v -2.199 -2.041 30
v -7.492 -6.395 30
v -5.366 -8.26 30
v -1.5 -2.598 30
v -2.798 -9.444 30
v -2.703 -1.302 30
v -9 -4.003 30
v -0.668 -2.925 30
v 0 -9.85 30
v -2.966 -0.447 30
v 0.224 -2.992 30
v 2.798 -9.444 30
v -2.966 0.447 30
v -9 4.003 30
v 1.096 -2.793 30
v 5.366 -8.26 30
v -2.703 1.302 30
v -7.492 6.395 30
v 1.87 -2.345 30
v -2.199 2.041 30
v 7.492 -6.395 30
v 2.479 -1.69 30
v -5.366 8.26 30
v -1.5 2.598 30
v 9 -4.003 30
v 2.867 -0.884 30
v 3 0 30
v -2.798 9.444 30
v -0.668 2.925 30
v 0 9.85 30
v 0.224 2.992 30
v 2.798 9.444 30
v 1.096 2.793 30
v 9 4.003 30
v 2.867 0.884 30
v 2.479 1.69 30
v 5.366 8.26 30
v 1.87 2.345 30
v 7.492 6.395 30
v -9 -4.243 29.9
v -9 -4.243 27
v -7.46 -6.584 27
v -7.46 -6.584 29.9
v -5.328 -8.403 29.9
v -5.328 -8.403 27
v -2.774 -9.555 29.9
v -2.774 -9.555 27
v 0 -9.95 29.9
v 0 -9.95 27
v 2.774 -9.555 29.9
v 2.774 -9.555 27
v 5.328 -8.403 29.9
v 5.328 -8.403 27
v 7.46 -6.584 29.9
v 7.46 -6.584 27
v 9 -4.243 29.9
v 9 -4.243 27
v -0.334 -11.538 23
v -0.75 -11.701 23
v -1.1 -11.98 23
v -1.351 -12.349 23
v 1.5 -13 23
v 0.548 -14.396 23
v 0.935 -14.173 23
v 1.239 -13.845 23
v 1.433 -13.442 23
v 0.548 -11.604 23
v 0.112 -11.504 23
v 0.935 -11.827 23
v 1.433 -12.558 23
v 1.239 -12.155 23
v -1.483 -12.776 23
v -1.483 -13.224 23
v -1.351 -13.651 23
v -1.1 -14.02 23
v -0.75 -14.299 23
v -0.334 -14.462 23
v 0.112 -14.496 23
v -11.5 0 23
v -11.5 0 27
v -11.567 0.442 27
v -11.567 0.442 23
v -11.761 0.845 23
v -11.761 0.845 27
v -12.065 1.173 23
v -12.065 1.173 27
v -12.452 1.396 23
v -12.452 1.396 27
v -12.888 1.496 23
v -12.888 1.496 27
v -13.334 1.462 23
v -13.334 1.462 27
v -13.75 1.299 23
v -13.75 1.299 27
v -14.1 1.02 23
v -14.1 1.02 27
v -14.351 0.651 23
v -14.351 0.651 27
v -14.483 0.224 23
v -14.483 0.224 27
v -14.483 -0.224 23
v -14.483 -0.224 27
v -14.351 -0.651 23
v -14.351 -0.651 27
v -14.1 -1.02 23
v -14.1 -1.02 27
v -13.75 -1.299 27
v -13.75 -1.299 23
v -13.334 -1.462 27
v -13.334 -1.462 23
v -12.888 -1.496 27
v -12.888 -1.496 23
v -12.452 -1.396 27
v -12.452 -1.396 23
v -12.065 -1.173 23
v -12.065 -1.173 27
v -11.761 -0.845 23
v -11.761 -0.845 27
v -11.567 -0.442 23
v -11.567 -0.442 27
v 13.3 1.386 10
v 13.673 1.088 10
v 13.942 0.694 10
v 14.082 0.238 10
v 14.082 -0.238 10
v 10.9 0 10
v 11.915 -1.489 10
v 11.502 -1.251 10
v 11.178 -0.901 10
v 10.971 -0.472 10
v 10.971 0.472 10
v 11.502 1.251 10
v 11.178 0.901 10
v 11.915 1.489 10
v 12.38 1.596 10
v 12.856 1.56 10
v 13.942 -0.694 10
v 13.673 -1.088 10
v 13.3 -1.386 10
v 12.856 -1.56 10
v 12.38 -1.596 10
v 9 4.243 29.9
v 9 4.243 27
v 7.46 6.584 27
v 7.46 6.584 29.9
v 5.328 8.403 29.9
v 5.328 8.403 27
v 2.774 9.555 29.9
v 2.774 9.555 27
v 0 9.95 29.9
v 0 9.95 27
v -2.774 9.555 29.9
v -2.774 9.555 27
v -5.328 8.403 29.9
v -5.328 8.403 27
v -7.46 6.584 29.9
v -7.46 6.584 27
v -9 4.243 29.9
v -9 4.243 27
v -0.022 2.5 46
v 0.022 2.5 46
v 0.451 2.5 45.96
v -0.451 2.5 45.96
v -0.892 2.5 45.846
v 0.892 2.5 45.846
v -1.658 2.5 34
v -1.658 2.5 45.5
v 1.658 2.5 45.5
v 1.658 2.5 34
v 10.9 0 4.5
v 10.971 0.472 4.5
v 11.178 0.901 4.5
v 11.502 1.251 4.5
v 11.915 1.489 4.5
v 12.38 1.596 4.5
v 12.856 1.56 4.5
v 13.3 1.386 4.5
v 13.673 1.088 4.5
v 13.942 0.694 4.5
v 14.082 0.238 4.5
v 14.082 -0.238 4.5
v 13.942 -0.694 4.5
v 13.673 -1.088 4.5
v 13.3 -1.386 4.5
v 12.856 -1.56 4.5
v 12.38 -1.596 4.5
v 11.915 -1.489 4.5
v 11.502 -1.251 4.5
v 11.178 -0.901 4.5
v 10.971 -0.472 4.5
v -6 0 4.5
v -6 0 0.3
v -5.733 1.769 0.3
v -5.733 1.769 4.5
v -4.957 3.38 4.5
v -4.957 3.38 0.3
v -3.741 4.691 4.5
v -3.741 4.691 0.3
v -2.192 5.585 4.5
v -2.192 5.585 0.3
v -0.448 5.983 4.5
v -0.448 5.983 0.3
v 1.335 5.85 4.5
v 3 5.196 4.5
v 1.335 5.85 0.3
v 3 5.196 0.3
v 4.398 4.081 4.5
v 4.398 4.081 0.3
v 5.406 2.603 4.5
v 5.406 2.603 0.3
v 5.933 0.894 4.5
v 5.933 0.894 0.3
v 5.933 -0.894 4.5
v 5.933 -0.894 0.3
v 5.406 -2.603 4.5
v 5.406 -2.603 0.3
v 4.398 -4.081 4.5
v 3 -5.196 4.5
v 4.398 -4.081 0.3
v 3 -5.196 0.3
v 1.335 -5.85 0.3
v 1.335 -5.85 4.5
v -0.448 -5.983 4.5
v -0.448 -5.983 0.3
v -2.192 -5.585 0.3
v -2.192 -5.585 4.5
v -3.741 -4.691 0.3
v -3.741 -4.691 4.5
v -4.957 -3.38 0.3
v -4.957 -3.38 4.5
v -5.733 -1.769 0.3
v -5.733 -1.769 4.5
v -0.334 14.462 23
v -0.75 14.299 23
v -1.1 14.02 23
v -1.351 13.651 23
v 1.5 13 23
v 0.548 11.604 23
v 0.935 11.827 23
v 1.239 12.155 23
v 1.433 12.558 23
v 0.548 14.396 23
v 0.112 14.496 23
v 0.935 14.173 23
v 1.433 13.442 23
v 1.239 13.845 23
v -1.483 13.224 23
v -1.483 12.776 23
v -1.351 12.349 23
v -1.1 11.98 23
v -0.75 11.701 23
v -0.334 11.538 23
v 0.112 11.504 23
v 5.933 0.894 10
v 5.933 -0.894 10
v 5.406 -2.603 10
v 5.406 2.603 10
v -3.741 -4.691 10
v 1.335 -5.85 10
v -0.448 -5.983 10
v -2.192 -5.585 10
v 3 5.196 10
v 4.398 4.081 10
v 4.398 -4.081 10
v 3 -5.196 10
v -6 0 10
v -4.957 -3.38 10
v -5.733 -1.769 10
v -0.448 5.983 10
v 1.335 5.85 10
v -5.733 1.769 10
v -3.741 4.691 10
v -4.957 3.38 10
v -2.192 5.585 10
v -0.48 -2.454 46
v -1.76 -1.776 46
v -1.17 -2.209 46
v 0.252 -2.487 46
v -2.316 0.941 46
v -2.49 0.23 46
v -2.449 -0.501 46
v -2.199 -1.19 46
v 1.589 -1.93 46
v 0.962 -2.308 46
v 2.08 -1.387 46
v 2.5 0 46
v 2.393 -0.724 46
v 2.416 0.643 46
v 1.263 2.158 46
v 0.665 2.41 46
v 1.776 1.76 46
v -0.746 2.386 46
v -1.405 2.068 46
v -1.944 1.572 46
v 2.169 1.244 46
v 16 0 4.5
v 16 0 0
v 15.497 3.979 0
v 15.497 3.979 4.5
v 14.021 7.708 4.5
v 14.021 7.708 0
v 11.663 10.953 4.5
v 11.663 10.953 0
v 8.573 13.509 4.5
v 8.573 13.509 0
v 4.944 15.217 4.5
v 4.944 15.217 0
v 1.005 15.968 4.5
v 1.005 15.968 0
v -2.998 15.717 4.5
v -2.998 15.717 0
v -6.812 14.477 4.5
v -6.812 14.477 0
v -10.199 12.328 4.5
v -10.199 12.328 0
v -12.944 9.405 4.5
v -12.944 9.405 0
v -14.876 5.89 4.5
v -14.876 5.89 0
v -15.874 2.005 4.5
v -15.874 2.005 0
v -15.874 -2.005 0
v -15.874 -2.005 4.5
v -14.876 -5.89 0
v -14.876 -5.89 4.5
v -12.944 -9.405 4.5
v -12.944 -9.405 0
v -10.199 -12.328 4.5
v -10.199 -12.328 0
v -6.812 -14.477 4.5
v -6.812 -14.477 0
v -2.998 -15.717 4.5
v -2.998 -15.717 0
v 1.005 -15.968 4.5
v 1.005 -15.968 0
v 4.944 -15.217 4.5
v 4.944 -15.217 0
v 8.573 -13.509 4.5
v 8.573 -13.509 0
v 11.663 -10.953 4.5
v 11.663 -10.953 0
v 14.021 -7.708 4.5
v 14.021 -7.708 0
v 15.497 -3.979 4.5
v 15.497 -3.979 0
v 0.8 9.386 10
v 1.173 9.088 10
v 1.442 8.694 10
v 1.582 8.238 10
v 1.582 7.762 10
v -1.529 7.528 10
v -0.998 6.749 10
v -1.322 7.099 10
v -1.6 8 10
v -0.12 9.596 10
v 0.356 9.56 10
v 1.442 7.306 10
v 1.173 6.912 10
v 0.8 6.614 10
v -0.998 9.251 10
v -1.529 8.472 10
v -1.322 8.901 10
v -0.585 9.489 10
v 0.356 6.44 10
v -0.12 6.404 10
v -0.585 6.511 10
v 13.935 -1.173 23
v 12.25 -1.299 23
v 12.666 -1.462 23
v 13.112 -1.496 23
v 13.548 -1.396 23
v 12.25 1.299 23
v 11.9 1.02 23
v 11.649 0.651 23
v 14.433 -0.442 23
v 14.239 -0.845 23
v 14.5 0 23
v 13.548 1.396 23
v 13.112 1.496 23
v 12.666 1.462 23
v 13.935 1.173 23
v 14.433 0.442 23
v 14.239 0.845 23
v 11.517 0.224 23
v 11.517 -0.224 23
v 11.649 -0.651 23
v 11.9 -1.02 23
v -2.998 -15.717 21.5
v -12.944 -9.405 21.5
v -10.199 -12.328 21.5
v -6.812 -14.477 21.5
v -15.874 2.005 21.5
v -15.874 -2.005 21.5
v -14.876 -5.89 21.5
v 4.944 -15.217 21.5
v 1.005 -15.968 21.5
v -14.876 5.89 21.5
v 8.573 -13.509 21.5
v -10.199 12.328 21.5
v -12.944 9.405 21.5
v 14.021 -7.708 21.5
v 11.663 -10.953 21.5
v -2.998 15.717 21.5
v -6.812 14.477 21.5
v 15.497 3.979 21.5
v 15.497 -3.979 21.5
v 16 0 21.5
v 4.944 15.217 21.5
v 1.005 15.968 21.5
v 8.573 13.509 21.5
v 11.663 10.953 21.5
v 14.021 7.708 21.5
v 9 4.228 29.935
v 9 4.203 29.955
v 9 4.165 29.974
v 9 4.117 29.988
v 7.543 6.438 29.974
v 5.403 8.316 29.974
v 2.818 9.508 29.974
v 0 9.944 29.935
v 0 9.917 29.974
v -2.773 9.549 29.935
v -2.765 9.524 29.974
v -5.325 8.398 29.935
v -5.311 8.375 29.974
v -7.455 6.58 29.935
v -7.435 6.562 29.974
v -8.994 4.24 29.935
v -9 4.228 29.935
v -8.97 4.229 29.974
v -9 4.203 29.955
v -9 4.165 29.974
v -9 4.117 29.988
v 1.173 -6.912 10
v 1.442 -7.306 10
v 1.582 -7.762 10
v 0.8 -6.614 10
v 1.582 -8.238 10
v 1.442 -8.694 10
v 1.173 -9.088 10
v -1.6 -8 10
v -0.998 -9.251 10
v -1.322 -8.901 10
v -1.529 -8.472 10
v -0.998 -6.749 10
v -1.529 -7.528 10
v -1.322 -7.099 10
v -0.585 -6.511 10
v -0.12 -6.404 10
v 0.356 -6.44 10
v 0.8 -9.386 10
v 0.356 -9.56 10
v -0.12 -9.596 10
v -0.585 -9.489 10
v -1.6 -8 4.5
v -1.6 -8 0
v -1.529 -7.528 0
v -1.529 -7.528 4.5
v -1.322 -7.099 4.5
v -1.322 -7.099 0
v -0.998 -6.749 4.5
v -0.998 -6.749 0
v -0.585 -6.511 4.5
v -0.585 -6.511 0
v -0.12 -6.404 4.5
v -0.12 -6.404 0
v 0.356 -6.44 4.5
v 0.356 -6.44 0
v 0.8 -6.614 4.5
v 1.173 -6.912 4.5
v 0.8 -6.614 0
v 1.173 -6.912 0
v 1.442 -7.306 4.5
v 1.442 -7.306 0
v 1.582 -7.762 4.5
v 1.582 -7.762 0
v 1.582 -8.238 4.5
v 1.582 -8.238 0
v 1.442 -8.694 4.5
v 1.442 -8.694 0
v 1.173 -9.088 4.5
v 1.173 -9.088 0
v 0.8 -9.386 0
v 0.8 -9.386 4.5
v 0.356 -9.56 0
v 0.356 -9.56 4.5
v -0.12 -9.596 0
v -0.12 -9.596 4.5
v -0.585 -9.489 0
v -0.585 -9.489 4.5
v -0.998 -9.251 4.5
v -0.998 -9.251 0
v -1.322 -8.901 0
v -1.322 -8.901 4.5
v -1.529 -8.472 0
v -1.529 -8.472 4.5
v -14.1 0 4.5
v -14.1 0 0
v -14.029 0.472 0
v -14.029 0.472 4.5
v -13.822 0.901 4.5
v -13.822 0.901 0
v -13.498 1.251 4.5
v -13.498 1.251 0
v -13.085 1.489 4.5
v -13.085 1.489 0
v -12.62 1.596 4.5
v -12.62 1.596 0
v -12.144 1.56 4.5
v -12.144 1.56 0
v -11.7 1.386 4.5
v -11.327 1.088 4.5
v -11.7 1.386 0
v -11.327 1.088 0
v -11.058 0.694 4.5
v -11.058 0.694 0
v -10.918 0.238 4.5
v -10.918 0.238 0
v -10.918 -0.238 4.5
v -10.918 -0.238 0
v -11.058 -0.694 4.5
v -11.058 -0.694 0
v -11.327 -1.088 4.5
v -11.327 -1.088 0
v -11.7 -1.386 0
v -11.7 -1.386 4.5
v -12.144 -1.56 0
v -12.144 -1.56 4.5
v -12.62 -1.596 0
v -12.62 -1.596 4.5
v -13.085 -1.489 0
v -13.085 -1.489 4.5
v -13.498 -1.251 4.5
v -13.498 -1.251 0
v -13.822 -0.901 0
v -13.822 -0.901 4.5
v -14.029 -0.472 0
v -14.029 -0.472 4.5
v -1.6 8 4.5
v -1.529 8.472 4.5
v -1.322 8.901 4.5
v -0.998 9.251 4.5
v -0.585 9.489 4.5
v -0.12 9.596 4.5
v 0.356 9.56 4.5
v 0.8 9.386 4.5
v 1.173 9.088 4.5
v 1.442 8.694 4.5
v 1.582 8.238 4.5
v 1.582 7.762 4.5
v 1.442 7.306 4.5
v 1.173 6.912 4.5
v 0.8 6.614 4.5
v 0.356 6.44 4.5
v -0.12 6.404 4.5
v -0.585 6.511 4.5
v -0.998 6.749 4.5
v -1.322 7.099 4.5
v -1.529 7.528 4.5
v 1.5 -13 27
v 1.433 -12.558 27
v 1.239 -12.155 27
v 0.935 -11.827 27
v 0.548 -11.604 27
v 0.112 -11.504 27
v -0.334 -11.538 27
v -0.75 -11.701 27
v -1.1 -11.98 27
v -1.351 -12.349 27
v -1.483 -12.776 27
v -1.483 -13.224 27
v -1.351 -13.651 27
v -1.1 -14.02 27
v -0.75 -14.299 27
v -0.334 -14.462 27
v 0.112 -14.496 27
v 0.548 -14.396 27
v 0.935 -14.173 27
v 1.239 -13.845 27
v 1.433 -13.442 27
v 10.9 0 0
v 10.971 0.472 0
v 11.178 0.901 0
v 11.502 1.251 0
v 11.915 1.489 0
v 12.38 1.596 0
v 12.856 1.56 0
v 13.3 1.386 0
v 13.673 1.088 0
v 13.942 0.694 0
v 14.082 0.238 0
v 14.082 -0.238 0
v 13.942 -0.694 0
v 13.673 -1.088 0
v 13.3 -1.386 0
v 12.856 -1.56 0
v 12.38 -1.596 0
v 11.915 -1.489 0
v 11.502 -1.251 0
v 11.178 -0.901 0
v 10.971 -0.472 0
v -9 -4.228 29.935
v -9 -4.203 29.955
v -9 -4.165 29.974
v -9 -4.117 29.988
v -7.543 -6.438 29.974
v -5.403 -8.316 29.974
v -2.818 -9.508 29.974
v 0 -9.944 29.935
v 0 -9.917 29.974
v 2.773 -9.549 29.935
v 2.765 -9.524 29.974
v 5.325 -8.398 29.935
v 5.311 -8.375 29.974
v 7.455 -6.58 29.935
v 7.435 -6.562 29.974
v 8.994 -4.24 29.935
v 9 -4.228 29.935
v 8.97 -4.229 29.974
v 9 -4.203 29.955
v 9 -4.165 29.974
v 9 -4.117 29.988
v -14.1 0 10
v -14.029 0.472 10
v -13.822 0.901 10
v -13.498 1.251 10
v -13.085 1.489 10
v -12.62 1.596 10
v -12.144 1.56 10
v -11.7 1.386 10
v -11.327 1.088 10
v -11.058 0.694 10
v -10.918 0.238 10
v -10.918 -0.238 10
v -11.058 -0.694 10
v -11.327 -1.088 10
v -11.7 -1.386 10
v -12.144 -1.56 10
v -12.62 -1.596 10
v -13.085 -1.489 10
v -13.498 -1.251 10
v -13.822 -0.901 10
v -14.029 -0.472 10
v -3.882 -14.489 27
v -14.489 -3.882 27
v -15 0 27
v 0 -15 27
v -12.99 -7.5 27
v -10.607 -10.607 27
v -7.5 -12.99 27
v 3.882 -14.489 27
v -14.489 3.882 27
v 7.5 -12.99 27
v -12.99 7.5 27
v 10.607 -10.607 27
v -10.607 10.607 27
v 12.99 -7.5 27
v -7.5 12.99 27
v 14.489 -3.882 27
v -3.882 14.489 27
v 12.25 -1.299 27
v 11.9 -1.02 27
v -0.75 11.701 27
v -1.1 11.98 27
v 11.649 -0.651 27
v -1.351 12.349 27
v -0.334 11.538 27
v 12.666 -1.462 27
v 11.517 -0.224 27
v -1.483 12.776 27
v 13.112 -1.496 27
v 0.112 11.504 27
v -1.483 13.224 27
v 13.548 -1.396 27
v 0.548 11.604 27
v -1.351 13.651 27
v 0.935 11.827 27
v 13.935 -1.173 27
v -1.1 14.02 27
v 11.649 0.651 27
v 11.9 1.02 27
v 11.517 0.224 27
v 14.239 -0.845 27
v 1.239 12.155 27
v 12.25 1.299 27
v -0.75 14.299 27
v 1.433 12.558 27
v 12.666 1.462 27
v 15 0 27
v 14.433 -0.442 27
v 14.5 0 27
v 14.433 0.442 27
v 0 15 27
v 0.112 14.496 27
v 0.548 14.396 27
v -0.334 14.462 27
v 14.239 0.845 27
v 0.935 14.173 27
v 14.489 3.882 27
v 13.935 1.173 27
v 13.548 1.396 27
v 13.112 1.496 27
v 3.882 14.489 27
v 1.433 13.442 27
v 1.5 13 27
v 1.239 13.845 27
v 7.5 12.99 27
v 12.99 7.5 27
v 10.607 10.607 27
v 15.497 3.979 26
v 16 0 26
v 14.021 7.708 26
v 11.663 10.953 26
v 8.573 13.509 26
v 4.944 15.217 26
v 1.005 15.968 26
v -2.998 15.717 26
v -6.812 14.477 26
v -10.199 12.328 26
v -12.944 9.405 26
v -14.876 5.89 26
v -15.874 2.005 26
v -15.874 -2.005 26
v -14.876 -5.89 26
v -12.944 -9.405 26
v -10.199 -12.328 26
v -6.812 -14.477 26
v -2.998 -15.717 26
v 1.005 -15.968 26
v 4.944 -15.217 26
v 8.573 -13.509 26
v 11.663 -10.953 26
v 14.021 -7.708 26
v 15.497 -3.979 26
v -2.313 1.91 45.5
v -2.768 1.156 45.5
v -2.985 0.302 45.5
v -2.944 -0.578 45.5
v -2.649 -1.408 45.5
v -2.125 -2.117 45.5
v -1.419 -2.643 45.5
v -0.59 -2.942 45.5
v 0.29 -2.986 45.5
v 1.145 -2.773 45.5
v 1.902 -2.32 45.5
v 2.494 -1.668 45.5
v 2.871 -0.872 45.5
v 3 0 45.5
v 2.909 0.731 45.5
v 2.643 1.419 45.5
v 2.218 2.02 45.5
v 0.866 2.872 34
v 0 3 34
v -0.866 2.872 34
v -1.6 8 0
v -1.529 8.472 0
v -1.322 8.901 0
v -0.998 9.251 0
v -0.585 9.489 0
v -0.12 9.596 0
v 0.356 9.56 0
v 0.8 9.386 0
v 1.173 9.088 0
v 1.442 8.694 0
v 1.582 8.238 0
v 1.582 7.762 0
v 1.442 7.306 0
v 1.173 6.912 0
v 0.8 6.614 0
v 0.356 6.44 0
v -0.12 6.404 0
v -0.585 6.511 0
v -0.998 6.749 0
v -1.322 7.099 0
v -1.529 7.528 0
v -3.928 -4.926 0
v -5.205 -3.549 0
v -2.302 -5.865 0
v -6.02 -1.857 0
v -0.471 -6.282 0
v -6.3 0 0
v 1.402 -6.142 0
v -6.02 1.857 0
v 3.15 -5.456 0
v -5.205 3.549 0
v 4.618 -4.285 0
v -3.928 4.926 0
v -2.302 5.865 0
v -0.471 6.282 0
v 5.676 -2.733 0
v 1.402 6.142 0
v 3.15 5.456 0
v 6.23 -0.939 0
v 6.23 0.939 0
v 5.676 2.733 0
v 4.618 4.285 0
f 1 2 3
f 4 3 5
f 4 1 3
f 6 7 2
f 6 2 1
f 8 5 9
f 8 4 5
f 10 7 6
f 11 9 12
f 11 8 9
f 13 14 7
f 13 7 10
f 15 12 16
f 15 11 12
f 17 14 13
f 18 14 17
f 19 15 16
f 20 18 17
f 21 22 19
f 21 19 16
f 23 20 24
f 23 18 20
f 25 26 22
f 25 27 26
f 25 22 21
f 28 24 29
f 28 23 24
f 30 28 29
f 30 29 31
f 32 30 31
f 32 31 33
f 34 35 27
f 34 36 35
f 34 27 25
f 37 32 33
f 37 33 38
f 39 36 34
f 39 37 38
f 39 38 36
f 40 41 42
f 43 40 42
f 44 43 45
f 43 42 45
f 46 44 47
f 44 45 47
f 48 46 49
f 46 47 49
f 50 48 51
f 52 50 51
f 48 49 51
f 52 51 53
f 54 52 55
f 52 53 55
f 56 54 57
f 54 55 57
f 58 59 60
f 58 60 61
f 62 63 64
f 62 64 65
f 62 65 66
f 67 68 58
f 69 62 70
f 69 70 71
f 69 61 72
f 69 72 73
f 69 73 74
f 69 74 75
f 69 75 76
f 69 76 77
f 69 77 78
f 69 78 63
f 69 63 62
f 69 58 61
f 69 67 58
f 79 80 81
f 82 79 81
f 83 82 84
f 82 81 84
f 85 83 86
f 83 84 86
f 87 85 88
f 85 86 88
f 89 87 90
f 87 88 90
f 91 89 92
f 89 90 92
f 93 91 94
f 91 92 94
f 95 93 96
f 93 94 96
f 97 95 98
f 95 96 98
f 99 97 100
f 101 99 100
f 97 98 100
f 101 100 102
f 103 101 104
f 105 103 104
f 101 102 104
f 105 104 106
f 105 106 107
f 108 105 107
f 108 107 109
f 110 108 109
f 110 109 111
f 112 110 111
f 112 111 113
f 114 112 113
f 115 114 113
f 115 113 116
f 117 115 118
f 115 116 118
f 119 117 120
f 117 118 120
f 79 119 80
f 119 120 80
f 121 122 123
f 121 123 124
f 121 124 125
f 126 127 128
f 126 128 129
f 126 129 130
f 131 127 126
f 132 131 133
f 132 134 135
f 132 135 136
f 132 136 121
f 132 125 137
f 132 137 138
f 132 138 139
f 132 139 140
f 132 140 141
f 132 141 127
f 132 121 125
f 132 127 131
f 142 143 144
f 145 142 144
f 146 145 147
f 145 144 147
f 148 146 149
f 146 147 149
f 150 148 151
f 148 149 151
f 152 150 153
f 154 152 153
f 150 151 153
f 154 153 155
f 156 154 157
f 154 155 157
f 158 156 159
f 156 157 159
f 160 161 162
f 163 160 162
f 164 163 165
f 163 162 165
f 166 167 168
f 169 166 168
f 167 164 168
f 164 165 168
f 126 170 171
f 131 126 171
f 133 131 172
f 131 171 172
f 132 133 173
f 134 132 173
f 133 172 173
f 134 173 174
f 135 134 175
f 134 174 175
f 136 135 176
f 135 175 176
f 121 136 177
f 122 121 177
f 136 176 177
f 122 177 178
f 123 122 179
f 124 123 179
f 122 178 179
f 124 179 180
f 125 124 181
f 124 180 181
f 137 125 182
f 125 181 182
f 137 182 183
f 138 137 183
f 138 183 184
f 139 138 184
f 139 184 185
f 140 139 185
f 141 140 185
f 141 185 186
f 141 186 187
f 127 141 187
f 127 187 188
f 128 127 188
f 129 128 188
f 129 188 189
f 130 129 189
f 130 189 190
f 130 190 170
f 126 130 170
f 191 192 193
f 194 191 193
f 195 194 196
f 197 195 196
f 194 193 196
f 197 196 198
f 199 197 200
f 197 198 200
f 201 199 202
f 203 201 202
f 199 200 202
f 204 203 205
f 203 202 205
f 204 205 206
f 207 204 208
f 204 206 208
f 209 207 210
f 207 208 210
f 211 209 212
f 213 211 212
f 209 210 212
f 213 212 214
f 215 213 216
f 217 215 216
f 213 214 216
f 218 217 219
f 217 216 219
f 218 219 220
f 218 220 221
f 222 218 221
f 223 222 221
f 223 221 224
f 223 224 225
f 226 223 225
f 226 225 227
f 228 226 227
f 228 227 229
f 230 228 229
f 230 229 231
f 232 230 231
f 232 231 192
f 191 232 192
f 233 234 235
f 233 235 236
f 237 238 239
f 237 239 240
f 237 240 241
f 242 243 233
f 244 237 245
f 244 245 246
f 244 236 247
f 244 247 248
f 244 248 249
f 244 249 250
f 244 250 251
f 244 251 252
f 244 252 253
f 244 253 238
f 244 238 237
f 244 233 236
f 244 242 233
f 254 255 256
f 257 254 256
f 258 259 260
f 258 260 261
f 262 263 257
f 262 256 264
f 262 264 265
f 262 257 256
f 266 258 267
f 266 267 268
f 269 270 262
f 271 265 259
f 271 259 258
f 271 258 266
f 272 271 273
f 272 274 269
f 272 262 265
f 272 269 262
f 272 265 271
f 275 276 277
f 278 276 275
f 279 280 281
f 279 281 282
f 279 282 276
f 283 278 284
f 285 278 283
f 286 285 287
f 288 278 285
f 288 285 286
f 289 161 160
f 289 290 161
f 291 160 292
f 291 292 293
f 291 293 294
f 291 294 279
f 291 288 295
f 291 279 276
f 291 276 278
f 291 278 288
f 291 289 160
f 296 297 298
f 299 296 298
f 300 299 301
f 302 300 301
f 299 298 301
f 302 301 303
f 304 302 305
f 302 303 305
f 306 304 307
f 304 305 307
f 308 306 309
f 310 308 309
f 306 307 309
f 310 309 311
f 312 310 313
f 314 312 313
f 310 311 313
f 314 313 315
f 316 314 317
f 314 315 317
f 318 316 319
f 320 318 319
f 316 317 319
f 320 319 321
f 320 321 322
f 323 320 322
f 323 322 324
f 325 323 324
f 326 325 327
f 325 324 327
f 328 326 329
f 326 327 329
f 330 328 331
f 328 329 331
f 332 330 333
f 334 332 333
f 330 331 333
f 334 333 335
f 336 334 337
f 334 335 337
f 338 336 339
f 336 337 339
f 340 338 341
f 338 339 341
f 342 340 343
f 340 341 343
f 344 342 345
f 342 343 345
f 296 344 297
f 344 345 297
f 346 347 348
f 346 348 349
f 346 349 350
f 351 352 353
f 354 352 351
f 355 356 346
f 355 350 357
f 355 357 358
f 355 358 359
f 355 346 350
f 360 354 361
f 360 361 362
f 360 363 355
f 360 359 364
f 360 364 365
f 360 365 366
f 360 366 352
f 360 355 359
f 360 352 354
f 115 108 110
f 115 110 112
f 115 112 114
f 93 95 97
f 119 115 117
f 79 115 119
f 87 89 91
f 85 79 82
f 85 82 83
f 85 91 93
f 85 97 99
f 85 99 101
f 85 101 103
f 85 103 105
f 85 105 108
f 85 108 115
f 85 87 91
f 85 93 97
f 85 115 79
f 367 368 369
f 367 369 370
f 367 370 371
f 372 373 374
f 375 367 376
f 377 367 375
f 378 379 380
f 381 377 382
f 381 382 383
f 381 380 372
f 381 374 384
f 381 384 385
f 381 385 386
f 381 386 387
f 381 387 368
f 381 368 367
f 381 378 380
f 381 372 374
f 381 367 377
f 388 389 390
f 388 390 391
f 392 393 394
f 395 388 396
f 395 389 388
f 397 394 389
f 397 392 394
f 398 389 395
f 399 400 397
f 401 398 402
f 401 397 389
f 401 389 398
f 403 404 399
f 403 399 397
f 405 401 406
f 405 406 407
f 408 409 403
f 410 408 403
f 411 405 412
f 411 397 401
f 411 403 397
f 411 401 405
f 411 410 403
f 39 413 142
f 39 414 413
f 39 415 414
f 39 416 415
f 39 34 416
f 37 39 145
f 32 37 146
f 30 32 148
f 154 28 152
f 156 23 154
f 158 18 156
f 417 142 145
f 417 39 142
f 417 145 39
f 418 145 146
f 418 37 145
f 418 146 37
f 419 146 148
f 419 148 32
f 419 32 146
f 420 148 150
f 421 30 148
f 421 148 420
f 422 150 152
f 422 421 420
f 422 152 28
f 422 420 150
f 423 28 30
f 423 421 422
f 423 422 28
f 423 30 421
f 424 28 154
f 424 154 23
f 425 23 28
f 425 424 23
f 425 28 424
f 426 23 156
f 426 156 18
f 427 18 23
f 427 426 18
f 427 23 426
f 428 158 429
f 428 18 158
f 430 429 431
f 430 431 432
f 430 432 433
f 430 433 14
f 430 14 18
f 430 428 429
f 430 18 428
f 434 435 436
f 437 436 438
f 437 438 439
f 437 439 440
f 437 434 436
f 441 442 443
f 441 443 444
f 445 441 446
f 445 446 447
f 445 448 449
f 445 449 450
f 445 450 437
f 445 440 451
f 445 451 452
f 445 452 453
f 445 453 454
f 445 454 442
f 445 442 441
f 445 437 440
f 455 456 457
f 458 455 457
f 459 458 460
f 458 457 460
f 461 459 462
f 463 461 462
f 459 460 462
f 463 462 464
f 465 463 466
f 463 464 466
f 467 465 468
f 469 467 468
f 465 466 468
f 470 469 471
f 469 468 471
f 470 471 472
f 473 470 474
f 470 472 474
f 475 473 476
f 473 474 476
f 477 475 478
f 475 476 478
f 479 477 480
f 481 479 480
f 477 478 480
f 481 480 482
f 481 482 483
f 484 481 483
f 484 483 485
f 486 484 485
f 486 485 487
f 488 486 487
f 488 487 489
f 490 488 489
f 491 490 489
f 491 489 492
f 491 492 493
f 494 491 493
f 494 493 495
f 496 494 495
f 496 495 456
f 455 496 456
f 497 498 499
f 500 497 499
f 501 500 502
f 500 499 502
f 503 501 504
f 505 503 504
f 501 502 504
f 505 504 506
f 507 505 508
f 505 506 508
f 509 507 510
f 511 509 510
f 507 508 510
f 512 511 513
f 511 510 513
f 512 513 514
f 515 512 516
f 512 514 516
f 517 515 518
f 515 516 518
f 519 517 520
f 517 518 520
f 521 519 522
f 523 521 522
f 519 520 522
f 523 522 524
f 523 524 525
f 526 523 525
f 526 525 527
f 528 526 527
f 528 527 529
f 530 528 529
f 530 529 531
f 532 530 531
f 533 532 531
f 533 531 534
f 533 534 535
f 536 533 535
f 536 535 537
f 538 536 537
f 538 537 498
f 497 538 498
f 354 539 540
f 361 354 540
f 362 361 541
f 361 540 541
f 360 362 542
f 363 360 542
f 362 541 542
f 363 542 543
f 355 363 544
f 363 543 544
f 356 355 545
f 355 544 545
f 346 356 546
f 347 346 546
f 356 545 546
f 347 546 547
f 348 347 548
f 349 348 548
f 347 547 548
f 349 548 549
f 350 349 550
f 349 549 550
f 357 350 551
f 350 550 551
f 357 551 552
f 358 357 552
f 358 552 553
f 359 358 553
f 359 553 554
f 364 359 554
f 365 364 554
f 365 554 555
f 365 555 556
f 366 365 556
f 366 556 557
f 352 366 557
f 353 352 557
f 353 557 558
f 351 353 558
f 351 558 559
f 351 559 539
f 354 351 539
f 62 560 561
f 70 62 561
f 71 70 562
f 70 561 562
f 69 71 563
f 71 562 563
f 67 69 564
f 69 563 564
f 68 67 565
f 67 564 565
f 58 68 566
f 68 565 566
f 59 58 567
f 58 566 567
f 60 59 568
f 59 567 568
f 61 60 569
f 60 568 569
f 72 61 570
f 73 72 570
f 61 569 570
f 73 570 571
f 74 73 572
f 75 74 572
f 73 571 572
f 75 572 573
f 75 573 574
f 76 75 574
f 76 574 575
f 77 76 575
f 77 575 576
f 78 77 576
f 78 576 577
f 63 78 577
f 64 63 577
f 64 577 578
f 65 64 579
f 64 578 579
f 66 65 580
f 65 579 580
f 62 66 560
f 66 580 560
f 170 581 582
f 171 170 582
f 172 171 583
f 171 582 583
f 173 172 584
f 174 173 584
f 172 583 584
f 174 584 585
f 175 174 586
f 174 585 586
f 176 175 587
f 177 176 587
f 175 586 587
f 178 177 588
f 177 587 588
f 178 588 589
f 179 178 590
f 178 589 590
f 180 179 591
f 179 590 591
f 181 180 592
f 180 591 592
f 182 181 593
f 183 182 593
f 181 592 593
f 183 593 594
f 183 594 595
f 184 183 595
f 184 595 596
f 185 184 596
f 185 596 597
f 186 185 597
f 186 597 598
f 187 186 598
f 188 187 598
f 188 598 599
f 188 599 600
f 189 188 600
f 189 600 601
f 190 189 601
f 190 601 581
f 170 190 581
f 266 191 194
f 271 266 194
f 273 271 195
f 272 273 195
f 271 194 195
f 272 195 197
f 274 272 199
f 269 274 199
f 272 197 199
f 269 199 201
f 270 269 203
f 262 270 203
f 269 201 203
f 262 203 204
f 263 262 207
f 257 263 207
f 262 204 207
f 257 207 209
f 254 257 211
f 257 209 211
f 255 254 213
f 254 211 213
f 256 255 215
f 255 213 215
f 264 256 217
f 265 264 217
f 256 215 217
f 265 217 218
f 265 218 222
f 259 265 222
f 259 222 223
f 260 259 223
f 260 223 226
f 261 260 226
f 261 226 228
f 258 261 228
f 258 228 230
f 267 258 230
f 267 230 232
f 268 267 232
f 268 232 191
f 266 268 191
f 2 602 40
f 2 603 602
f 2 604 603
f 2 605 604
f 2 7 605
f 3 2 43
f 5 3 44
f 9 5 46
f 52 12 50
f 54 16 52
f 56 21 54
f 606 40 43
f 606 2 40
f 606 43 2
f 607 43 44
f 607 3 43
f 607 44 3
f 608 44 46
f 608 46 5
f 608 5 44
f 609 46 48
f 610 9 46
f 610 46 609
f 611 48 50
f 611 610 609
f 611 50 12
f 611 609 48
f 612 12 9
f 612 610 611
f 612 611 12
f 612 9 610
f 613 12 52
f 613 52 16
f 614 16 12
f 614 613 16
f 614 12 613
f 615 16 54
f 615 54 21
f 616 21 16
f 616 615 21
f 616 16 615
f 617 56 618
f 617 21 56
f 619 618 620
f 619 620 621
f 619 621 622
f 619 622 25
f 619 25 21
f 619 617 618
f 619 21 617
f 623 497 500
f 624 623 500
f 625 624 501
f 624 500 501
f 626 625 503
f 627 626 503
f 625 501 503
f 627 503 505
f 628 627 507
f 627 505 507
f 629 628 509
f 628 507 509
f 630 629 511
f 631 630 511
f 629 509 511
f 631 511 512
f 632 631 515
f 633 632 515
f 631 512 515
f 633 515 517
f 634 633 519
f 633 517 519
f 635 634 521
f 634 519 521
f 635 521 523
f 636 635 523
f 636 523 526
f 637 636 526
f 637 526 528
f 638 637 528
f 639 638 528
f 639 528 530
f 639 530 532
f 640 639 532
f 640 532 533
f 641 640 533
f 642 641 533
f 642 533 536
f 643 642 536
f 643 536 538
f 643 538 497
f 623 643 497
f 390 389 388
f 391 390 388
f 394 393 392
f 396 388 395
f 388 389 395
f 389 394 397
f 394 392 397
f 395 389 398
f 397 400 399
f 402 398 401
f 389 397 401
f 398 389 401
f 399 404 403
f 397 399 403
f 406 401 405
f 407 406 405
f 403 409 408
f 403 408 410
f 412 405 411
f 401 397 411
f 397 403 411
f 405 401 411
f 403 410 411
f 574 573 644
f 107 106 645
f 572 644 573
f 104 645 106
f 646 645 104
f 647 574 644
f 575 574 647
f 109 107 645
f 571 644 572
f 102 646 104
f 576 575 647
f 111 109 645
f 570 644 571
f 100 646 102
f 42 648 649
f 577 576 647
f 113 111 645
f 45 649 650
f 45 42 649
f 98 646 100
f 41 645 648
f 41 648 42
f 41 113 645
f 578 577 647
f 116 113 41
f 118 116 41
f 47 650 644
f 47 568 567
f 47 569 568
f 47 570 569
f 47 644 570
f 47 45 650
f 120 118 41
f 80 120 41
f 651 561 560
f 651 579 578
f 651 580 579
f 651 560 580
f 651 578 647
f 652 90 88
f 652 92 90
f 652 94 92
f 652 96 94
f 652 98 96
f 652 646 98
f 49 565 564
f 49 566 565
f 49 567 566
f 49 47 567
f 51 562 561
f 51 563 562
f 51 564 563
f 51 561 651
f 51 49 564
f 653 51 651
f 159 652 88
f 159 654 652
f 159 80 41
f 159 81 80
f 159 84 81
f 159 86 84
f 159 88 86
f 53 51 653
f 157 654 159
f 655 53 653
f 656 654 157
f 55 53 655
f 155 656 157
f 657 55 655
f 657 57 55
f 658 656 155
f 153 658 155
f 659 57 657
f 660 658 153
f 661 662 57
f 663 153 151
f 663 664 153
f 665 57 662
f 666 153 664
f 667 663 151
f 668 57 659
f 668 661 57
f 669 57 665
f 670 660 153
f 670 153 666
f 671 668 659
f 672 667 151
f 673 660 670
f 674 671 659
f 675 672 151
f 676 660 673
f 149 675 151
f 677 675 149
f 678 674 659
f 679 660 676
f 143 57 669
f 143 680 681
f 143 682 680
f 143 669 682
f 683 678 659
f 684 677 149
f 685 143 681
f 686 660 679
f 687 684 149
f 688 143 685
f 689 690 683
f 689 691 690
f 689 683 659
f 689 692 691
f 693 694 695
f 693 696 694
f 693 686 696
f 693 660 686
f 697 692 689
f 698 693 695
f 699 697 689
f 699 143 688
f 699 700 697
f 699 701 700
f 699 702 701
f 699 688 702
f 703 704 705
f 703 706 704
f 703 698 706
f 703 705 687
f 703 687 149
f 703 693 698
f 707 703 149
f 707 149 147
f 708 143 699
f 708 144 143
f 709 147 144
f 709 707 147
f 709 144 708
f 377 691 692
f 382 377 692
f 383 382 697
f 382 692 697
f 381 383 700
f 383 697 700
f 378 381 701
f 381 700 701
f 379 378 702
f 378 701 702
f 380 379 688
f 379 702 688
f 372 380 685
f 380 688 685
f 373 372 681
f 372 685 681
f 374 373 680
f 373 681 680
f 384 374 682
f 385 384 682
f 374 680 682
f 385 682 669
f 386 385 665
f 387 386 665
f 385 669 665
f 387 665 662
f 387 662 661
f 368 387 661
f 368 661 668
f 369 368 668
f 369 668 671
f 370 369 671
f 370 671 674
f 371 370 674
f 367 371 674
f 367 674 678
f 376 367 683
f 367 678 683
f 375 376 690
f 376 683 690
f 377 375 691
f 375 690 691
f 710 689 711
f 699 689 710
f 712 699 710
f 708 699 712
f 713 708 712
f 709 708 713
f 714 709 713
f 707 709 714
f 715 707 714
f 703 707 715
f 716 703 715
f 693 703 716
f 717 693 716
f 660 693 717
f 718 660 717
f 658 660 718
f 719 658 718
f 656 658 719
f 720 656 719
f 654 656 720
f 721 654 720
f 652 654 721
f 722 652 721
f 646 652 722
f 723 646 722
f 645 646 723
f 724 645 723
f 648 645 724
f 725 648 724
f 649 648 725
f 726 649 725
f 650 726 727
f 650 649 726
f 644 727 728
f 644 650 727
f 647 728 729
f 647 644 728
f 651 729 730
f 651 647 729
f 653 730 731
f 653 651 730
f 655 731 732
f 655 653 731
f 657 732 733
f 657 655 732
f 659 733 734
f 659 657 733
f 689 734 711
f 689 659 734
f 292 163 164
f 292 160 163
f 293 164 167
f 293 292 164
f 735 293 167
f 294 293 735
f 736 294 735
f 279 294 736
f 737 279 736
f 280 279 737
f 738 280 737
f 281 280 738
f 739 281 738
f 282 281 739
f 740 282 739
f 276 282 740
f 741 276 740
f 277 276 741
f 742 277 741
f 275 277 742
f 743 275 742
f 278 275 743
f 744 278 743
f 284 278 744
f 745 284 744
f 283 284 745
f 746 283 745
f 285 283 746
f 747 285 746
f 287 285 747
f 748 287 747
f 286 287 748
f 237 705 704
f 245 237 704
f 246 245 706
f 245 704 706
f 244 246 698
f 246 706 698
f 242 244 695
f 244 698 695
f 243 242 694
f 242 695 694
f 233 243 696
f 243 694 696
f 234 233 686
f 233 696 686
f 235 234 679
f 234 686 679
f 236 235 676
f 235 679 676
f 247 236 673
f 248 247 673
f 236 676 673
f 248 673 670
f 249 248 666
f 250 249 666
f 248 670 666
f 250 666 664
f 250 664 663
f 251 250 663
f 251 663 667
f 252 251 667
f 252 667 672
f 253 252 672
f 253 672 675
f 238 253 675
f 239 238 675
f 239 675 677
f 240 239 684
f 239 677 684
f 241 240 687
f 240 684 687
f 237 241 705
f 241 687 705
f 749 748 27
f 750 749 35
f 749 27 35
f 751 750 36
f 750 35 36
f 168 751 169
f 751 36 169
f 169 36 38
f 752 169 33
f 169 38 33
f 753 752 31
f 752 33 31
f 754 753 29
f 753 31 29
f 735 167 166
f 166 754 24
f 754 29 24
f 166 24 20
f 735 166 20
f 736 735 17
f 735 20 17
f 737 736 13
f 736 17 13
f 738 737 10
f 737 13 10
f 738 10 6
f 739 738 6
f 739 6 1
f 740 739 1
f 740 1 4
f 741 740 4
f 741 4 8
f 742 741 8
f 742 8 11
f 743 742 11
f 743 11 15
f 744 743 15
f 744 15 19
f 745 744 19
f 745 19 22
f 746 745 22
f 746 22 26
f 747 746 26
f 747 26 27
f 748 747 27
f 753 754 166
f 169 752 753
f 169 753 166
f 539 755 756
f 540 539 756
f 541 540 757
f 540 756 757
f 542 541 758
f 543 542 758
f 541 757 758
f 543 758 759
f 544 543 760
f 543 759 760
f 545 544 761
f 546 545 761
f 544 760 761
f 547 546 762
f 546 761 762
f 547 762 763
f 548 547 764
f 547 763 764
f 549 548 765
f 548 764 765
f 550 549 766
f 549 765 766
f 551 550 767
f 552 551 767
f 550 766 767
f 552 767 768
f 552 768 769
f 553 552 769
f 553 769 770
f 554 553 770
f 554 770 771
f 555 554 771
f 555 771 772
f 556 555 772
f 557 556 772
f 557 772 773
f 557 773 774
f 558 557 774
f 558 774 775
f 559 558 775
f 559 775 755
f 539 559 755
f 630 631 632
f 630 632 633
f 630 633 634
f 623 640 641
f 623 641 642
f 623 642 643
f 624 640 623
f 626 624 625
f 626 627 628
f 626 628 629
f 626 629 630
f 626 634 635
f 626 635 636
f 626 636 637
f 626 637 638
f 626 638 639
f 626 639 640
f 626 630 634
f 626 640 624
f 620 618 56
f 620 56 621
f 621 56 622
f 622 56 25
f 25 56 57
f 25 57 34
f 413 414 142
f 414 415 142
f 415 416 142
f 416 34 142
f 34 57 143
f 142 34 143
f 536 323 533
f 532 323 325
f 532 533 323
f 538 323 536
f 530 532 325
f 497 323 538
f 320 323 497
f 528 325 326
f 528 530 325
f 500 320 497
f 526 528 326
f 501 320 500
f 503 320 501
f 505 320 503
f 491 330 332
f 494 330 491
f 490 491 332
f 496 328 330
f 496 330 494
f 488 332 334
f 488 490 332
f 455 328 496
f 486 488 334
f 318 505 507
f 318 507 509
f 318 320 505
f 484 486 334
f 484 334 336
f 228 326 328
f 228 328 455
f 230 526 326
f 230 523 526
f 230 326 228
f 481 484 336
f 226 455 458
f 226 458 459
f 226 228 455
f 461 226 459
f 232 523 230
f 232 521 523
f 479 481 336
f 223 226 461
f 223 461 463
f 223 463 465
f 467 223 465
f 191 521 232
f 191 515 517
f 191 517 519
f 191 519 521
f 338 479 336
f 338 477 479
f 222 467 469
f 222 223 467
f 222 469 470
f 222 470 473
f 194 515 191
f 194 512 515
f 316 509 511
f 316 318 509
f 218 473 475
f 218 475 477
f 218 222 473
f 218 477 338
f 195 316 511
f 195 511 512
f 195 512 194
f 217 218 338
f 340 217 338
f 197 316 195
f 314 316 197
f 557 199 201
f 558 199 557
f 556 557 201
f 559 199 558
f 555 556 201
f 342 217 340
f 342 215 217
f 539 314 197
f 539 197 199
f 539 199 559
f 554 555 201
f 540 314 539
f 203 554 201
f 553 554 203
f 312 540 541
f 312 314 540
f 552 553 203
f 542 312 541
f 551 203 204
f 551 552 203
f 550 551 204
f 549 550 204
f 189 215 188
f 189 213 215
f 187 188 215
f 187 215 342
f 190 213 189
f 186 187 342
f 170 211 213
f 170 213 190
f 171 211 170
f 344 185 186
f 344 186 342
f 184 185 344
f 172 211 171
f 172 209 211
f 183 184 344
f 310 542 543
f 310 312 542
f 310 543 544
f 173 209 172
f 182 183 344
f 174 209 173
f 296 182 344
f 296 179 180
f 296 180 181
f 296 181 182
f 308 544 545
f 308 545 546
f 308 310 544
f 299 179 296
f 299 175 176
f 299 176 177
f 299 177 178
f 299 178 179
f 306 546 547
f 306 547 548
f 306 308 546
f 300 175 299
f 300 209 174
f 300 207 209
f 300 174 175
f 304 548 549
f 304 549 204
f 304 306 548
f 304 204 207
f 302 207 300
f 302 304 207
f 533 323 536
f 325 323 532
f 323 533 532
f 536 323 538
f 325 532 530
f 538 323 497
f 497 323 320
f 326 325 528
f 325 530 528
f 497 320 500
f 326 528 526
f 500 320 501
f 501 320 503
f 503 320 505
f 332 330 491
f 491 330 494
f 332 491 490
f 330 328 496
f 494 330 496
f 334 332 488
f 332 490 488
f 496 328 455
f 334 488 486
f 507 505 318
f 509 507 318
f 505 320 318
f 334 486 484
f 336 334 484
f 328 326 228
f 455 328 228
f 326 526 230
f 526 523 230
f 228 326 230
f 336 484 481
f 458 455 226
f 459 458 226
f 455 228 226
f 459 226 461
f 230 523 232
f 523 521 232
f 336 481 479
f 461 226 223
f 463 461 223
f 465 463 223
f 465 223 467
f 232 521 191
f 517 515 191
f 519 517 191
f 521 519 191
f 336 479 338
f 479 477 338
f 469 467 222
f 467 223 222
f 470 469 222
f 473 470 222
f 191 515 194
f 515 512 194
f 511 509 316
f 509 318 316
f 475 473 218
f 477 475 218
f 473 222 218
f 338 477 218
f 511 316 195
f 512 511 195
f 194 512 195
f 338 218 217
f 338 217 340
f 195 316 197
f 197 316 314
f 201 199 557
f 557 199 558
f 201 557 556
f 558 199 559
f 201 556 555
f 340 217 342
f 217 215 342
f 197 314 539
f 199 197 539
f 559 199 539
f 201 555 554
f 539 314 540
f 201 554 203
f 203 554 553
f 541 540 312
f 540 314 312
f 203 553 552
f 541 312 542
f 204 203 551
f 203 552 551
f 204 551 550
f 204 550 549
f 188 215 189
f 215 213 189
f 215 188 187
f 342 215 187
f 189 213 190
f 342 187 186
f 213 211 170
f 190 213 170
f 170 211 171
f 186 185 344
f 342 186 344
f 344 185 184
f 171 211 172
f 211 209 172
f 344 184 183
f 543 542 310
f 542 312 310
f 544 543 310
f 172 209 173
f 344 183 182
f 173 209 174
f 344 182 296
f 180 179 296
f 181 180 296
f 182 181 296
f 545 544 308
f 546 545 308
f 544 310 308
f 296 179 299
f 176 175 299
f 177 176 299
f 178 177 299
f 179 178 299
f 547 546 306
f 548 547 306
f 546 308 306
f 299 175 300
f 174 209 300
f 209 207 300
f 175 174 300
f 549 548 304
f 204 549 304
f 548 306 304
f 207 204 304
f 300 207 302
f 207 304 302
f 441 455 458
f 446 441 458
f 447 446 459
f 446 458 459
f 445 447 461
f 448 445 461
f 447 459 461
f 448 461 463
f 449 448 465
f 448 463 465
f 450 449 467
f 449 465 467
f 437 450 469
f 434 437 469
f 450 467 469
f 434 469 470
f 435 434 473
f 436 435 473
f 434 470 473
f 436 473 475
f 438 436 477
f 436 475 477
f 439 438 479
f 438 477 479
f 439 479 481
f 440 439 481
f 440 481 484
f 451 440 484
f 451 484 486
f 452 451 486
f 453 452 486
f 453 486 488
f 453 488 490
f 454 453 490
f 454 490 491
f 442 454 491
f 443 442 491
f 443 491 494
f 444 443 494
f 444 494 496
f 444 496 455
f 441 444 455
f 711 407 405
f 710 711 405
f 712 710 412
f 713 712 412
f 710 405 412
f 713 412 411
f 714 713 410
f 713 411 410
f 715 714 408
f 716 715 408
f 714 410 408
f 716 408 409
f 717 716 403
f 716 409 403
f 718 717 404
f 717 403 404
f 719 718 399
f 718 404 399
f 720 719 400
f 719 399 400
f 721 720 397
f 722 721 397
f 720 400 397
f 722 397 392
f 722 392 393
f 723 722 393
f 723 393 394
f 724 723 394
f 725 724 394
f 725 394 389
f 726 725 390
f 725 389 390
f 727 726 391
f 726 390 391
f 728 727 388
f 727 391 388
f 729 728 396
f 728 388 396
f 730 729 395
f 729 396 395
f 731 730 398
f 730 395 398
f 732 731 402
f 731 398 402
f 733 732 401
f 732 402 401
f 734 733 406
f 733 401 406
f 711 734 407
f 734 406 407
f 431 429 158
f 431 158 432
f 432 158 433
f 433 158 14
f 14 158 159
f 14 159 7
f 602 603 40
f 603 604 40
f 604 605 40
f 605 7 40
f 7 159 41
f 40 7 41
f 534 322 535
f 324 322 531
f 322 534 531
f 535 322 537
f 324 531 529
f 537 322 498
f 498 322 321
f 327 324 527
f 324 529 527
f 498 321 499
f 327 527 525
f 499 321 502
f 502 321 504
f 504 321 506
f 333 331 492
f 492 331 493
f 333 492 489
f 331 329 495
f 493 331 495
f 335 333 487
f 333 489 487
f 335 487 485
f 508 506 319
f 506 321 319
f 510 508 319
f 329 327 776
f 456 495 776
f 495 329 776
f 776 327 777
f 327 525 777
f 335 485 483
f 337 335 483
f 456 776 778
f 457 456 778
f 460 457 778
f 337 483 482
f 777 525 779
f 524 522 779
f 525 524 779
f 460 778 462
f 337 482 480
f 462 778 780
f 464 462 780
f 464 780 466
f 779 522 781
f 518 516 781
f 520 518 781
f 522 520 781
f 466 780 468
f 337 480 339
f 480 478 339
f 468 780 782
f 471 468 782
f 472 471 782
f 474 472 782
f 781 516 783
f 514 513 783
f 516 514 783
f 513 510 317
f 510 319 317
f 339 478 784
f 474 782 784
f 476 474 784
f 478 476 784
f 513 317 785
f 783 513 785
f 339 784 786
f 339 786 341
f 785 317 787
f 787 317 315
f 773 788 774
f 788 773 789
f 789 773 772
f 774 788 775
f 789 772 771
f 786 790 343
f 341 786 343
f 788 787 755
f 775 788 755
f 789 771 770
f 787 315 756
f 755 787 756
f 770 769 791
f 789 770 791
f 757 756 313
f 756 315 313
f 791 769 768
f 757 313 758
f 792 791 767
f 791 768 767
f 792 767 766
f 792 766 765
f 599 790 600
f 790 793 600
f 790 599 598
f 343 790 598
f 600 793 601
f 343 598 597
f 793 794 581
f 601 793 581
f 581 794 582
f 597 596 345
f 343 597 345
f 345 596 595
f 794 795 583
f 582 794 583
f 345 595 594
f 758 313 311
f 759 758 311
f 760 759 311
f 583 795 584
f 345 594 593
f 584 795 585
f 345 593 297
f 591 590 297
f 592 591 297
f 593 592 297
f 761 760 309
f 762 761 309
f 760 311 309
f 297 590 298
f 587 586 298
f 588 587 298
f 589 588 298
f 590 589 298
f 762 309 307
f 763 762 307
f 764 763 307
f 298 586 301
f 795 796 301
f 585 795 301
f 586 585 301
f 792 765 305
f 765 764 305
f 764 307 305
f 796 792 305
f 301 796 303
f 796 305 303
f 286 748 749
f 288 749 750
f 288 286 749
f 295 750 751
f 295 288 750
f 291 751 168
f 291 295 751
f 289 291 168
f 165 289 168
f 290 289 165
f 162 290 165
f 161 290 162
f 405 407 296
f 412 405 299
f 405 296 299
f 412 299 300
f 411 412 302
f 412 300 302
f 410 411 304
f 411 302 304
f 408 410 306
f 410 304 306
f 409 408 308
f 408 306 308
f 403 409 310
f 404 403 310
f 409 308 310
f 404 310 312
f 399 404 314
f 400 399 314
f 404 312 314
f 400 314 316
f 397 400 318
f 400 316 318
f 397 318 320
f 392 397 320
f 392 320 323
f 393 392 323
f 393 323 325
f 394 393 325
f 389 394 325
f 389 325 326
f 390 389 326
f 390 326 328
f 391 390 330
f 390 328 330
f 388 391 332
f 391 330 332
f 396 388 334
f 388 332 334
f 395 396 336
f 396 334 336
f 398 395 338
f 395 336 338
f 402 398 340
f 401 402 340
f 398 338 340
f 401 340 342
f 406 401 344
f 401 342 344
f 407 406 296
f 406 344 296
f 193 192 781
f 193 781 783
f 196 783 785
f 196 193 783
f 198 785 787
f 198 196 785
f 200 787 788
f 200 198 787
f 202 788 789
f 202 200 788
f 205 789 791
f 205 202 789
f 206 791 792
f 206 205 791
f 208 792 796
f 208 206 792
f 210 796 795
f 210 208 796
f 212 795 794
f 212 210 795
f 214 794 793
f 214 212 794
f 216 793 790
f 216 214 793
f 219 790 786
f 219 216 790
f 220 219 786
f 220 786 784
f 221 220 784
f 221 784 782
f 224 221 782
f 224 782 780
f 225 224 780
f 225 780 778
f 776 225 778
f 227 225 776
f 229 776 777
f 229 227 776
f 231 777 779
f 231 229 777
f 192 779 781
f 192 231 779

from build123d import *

# Parameters (mm, degrees)
SKETCH_1_R          = 16
EXTRUDE_1_DEPTH     = 4.5
SKETCH_2_R          = 16
EXTRUDE_2_DEPTH     = 17
SKETCH_3_R          = 16
EXTRUDE_3_DEPTH     = 5.5
CHAMFER_1_SIZE      = 1
EXTRUDE_4_DEPTH     = 3
FILLET_1_R          = 0.1
SKETCH_5_R          = 3
EXTRUDE_5_DEPTH     = 16
CUT_EXTRUDE_1_DEPTH = 12
CHAMFER_2_SIZE      = 0.5
SKETCH_7_R          = 1.5
CUT_EXTRUDE_2_DEPTH = 4
SKETCH_8_R          = 6
SKETCH_8_R_2        = 1.6
CUT_EXTRUDE_3_DEPTH = 10
CHAMFER_3_SIZE      = 0.3


with BuildPart() as part:
    # ｽｹｯﾁ1 → ﾎﾞｽ - 押し出し1 (new body)
    with BuildSketch(Plane.XY):
        Circle(SKETCH_1_R)
    extrude(amount=EXTRUDE_1_DEPTH)


with BuildPart() as body_2:
    # ｽｹｯﾁ2 → ﾎﾞｽ - 押し出し2 (new body)
    with BuildSketch(Plane.XY.offset(4.5)):
        Circle(SKETCH_2_R)
    extrude(amount=EXTRUDE_2_DEPTH)


with BuildPart() as body_3:
    # ｽｹｯﾁ3 → ﾎﾞｽ - 押し出し3 (new body)
    with BuildSketch(Plane.XY.offset(21.5)):
        Circle(SKETCH_3_R)
    extrude(amount=EXTRUDE_3_DEPTH)

    # 面取り1
    chamfer_1_edges = [body_3.edges().sort_by_distance(p)[0] for p in [
        (-16, 0, 27),
    ]]
    chamfer(chamfer_1_edges, length=CHAMFER_1_SIZE)

    # ｽｹｯﾁ4 → ﾎﾞｽ - 押し出し4 (add)
    with BuildSketch(Plane.XY.offset(27)):
        with BuildLine():
            Line((-9, 4.242935305), (-9, -4.242935305))
            ThreePointArc((-9, -4.242935305), (0, -9.95), (9, -4.242935305))
            Line((9, -4.242935305), (9, 4.242935305))
            ThreePointArc((9, 4.242935305), (0, 9.95), (-9, 4.242935305))
        make_face()
    extrude(amount=EXTRUDE_4_DEPTH)

    # ﾌｨﾚｯﾄ1
    fillet_1_edges = [body_3.edges().sort_by_distance(p)[0] for p in [
        (0, 9.95, 30),
        (0, -9.95, 30),
    ]]
    fillet(fillet_1_edges, radius=FILLET_1_R)

    # ｽｹｯﾁ5 → ﾎﾞｽ - 押し出し5 (add)
    with BuildSketch(Plane.XY.offset(30)):
        Circle(SKETCH_5_R)
    extrude(amount=EXTRUDE_5_DEPTH)

    # ｽｹｯﾁ6 → ｶｯﾄ - 押し出し1 (cut)
    with BuildSketch(Plane.XY.offset(46)):
        with BuildLine():
            Line((-1.658312395, 2.5), (1.658312395, 2.5))
            ThreePointArc((1.658312395, 2.5), (0, 3), (-1.658312395, 2.5))
        make_face()
    extrude(amount=-CUT_EXTRUDE_1_DEPTH, mode=Mode.SUBTRACT)

    # 面取り2
    chamfer_2_edges = [body_3.edges().sort_by_distance(p)[0] for p in [
        (-1.418637165, -2.643382037, 46),
    ]]
    chamfer(chamfer_2_edges, length=CHAMFER_2_SIZE - 0.0001)  # a hair under: the kernel refuses the full size

    # ｽｹｯﾁ7 → ｶｯﾄ - 押し出し2 (cut)
    with BuildSketch(Plane.XY.offset(27)):
        with Locations((0, 13)):
            Circle(SKETCH_7_R)
        with Locations((13, 0)):
            Circle(SKETCH_7_R)
        with Locations((0, -13)):
            Circle(SKETCH_7_R)
        with Locations((-13, 0)):
            Circle(SKETCH_7_R)
    extrude(amount=-CUT_EXTRUDE_2_DEPTH, mode=Mode.SUBTRACT)


with BuildPart() as cut_extrude_3_tool:
    # ｽｹｯﾁ8 → ｶｯﾄ - 押し出し3 (new body)
    with BuildSketch(Plane(origin=(0, 0, 0), x_dir=(-1, 0, 0), z_dir=(0, 0, -1))):
        Circle(SKETCH_8_R)
        with Locations((12.5, 0)):
            Circle(SKETCH_8_R_2)
        with Locations((-12.5, 0)):
            Circle(SKETCH_8_R_2)
        with Locations((0, 8)):
            Circle(SKETCH_8_R_2)
        with Locations((0, -8)):
            Circle(SKETCH_8_R_2)
    extrude(amount=-CUT_EXTRUDE_3_DEPTH)


with BuildPart() as part_1:
    add(part.part)

    # ｶｯﾄ - 押し出し3: cut by cut_extrude_3_tool
    add(cut_extrude_3_tool.part, mode=Mode.SUBTRACT)

    # 面取り3
    chamfer_3_edges = [part_1.edges().sort_by_distance(p)[0] for p in [
        (6, 0, 0),
    ]]
    chamfer(chamfer_3_edges, length=CHAMFER_3_SIZE)


with BuildPart() as body_2_1:
    add(body_2.part)

    # ｶｯﾄ - 押し出し3: cut by cut_extrude_3_tool
    add(cut_extrude_3_tool.part, mode=Mode.SUBTRACT)


solid = Compound([body_3.part, part_1.part, body_2_1.part])
